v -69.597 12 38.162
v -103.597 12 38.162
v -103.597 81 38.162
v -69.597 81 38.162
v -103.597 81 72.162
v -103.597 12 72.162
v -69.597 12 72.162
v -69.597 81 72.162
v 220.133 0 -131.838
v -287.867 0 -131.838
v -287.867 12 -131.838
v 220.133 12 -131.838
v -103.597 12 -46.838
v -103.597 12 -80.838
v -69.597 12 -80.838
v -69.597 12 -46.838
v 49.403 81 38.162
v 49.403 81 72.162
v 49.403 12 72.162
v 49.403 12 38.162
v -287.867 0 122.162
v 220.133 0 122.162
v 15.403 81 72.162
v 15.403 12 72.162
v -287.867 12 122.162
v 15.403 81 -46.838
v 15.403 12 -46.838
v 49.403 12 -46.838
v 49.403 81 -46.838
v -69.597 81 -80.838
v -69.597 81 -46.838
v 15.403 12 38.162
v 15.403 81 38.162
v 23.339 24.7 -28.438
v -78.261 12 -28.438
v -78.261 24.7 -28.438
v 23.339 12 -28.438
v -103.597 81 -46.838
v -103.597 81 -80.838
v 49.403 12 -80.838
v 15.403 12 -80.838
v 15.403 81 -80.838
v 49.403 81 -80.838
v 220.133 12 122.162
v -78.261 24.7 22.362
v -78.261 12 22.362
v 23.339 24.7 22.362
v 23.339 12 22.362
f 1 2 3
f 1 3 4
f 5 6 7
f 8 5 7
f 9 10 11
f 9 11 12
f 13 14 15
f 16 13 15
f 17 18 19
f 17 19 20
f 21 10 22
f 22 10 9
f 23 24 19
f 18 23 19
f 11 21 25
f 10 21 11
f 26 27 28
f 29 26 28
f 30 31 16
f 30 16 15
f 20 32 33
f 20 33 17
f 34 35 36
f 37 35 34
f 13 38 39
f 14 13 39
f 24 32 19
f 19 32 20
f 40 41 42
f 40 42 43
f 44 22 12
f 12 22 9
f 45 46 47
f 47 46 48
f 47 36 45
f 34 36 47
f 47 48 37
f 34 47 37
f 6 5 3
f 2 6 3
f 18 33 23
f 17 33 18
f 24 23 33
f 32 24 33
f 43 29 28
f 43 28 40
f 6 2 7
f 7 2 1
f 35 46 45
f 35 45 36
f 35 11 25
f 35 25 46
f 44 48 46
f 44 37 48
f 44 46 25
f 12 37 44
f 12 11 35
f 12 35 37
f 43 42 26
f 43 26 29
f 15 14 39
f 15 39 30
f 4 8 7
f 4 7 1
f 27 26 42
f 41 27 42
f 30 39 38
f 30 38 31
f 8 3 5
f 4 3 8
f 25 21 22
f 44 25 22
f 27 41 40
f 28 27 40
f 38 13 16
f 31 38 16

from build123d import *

# Parameters (mm, degrees)
SKETCH1_W             = 508
SKETCH1_H             = 254
BOSS_EXTRUDE1_DEPTH   = 12
SKETCH2_W             = 34
SKETCH2_H             = 34
BOSS_EXTRUDE2_DEPTH   = 69
BOSS_EXTRUDE2_2_DEPTH = 69
BOSS_EXTRUDE2_3_DEPTH = 69
BOSS_EXTRUDE2_4_DEPTH = 69
SKETCH3_W             = 101.6
SKETCH3_H             = 50.8
BOSS_EXTRUDE3_DEPTH   = 12.7


with BuildPart() as part:
    # Sketch1 → Boss-Extrude1 (new body)
    with BuildSketch(Plane(origin=(0, 0, 0), x_dir=(1, 0, 0), z_dir=(0, 1, 0))):
        with Locations((-33.866666667, 4.838095238)):
            Rectangle(SKETCH1_W, SKETCH1_H)
    extrude(amount=BOSS_EXTRUDE1_DEPTH)

    # Sketch3 → Boss-Extrude3 (add)
    with BuildSketch(Plane(origin=(0, 12, 0), x_dir=(1, 0, 0), z_dir=(0, 1, 0))):
        with Locations((-27.461335597, 3.038095238)):
            Rectangle(SKETCH3_W, SKETCH3_H)
    extrude(amount=BOSS_EXTRUDE3_DEPTH)


with BuildPart() as body_2:
    # Sketch2 → Boss-Extrude2 (new body)
    with BuildSketch(Plane(origin=(0, 12, 0), x_dir=(1, 0, 0), z_dir=(0, 1, 0))):
        with Locations((-86.596666667, 63.838095238)):
            Rectangle(SKETCH2_W, SKETCH2_H)
    extrude(amount=BOSS_EXTRUDE2_DEPTH)


with BuildPart() as body_3:
    # Sketch2 → Boss-Extrude2 2 (new body)
    with BuildSketch(Plane(origin=(0, 12, 0), x_dir=(1, 0, 0), z_dir=(0, 1, 0))):
        with Locations((32.403333333, 63.838095238)):
            Rectangle(SKETCH2_W, SKETCH2_H)
    extrude(amount=BOSS_EXTRUDE2_2_DEPTH)


with BuildPart() as body_4:
    # Sketch2 → Boss-Extrude2 3 (new body)
    with BuildSketch(Plane(origin=(0, 12, 0), x_dir=(1, 0, 0), z_dir=(0, 1, 0))):
        with Locations((-86.596666667, -55.161904762)):
            Rectangle(SKETCH2_W, SKETCH2_H)
    extrude(amount=BOSS_EXTRUDE2_3_DEPTH)


with BuildPart() as body_5:
    # Sketch2 → Boss-Extrude2 4 (new body)
    with BuildSketch(Plane(origin=(0, 12, 0), x_dir=(1, 0, 0), z_dir=(0, 1, 0))):
        with Locations((32.403333333, -55.161904762)):
            Rectangle(SKETCH2_W, SKETCH2_H)
    extrude(amount=BOSS_EXTRUDE2_4_DEPTH)


solid = Compound([part.part, body_2.part, body_3.part, body_4.part, body_5.part])
